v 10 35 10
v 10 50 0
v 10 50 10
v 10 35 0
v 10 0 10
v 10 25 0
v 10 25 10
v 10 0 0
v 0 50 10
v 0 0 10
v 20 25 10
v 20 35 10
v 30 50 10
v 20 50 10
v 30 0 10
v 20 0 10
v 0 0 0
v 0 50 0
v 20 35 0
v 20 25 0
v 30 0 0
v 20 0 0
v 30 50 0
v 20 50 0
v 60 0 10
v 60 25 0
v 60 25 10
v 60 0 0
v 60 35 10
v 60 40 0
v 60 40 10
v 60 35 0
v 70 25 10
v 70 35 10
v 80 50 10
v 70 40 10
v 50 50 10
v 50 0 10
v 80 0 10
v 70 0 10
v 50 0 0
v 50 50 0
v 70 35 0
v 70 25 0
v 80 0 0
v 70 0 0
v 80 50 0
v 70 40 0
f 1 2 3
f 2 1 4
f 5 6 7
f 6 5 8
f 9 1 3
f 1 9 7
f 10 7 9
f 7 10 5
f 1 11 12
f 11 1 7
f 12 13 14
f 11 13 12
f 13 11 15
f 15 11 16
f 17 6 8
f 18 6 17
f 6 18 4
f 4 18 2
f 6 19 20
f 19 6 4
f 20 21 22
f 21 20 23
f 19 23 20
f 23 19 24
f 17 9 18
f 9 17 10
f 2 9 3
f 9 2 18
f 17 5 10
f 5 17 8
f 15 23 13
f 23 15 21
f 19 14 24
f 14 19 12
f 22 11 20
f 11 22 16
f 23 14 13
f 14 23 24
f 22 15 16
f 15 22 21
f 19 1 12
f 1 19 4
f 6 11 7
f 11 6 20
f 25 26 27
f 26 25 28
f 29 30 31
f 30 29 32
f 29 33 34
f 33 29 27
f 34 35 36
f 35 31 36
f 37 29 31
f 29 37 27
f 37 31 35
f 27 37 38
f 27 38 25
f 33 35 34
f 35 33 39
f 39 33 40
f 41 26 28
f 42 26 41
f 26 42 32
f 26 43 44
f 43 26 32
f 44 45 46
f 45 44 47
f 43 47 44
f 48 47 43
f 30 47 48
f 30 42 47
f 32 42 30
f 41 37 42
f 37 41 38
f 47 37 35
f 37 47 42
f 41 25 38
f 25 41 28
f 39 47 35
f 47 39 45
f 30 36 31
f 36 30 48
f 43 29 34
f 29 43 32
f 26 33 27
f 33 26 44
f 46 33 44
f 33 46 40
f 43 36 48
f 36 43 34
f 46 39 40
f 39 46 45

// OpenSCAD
union(){
    translate(v=[0, 0, 0]){
        color("pink"){
            union(){
                cube(size=[10, 50, 10]);
                translate(v=[20, 0, 0]){
                    cube(size=[10, 50, 10]);
                };
                translate(v=[10, 25, 0]){
                    cube(size=[10, 10, 10]);
                };
            };
        };
    };
    translate(v=[50, 0, 0]){
        color("green"){
            union(){
                cube(size=[10, 50, 10]);
                translate(v=[0, 40, 0]){
                    cube(size=[30, 10, 10]);
                };
                translate(v=[0, 25, 0]){
                    cube(size=[30, 10, 10]);
                };
                translate(v=[20, 0, 0]){
                    cube(size=[10, 50, 10]);
                };
            };
        };
    };
};
